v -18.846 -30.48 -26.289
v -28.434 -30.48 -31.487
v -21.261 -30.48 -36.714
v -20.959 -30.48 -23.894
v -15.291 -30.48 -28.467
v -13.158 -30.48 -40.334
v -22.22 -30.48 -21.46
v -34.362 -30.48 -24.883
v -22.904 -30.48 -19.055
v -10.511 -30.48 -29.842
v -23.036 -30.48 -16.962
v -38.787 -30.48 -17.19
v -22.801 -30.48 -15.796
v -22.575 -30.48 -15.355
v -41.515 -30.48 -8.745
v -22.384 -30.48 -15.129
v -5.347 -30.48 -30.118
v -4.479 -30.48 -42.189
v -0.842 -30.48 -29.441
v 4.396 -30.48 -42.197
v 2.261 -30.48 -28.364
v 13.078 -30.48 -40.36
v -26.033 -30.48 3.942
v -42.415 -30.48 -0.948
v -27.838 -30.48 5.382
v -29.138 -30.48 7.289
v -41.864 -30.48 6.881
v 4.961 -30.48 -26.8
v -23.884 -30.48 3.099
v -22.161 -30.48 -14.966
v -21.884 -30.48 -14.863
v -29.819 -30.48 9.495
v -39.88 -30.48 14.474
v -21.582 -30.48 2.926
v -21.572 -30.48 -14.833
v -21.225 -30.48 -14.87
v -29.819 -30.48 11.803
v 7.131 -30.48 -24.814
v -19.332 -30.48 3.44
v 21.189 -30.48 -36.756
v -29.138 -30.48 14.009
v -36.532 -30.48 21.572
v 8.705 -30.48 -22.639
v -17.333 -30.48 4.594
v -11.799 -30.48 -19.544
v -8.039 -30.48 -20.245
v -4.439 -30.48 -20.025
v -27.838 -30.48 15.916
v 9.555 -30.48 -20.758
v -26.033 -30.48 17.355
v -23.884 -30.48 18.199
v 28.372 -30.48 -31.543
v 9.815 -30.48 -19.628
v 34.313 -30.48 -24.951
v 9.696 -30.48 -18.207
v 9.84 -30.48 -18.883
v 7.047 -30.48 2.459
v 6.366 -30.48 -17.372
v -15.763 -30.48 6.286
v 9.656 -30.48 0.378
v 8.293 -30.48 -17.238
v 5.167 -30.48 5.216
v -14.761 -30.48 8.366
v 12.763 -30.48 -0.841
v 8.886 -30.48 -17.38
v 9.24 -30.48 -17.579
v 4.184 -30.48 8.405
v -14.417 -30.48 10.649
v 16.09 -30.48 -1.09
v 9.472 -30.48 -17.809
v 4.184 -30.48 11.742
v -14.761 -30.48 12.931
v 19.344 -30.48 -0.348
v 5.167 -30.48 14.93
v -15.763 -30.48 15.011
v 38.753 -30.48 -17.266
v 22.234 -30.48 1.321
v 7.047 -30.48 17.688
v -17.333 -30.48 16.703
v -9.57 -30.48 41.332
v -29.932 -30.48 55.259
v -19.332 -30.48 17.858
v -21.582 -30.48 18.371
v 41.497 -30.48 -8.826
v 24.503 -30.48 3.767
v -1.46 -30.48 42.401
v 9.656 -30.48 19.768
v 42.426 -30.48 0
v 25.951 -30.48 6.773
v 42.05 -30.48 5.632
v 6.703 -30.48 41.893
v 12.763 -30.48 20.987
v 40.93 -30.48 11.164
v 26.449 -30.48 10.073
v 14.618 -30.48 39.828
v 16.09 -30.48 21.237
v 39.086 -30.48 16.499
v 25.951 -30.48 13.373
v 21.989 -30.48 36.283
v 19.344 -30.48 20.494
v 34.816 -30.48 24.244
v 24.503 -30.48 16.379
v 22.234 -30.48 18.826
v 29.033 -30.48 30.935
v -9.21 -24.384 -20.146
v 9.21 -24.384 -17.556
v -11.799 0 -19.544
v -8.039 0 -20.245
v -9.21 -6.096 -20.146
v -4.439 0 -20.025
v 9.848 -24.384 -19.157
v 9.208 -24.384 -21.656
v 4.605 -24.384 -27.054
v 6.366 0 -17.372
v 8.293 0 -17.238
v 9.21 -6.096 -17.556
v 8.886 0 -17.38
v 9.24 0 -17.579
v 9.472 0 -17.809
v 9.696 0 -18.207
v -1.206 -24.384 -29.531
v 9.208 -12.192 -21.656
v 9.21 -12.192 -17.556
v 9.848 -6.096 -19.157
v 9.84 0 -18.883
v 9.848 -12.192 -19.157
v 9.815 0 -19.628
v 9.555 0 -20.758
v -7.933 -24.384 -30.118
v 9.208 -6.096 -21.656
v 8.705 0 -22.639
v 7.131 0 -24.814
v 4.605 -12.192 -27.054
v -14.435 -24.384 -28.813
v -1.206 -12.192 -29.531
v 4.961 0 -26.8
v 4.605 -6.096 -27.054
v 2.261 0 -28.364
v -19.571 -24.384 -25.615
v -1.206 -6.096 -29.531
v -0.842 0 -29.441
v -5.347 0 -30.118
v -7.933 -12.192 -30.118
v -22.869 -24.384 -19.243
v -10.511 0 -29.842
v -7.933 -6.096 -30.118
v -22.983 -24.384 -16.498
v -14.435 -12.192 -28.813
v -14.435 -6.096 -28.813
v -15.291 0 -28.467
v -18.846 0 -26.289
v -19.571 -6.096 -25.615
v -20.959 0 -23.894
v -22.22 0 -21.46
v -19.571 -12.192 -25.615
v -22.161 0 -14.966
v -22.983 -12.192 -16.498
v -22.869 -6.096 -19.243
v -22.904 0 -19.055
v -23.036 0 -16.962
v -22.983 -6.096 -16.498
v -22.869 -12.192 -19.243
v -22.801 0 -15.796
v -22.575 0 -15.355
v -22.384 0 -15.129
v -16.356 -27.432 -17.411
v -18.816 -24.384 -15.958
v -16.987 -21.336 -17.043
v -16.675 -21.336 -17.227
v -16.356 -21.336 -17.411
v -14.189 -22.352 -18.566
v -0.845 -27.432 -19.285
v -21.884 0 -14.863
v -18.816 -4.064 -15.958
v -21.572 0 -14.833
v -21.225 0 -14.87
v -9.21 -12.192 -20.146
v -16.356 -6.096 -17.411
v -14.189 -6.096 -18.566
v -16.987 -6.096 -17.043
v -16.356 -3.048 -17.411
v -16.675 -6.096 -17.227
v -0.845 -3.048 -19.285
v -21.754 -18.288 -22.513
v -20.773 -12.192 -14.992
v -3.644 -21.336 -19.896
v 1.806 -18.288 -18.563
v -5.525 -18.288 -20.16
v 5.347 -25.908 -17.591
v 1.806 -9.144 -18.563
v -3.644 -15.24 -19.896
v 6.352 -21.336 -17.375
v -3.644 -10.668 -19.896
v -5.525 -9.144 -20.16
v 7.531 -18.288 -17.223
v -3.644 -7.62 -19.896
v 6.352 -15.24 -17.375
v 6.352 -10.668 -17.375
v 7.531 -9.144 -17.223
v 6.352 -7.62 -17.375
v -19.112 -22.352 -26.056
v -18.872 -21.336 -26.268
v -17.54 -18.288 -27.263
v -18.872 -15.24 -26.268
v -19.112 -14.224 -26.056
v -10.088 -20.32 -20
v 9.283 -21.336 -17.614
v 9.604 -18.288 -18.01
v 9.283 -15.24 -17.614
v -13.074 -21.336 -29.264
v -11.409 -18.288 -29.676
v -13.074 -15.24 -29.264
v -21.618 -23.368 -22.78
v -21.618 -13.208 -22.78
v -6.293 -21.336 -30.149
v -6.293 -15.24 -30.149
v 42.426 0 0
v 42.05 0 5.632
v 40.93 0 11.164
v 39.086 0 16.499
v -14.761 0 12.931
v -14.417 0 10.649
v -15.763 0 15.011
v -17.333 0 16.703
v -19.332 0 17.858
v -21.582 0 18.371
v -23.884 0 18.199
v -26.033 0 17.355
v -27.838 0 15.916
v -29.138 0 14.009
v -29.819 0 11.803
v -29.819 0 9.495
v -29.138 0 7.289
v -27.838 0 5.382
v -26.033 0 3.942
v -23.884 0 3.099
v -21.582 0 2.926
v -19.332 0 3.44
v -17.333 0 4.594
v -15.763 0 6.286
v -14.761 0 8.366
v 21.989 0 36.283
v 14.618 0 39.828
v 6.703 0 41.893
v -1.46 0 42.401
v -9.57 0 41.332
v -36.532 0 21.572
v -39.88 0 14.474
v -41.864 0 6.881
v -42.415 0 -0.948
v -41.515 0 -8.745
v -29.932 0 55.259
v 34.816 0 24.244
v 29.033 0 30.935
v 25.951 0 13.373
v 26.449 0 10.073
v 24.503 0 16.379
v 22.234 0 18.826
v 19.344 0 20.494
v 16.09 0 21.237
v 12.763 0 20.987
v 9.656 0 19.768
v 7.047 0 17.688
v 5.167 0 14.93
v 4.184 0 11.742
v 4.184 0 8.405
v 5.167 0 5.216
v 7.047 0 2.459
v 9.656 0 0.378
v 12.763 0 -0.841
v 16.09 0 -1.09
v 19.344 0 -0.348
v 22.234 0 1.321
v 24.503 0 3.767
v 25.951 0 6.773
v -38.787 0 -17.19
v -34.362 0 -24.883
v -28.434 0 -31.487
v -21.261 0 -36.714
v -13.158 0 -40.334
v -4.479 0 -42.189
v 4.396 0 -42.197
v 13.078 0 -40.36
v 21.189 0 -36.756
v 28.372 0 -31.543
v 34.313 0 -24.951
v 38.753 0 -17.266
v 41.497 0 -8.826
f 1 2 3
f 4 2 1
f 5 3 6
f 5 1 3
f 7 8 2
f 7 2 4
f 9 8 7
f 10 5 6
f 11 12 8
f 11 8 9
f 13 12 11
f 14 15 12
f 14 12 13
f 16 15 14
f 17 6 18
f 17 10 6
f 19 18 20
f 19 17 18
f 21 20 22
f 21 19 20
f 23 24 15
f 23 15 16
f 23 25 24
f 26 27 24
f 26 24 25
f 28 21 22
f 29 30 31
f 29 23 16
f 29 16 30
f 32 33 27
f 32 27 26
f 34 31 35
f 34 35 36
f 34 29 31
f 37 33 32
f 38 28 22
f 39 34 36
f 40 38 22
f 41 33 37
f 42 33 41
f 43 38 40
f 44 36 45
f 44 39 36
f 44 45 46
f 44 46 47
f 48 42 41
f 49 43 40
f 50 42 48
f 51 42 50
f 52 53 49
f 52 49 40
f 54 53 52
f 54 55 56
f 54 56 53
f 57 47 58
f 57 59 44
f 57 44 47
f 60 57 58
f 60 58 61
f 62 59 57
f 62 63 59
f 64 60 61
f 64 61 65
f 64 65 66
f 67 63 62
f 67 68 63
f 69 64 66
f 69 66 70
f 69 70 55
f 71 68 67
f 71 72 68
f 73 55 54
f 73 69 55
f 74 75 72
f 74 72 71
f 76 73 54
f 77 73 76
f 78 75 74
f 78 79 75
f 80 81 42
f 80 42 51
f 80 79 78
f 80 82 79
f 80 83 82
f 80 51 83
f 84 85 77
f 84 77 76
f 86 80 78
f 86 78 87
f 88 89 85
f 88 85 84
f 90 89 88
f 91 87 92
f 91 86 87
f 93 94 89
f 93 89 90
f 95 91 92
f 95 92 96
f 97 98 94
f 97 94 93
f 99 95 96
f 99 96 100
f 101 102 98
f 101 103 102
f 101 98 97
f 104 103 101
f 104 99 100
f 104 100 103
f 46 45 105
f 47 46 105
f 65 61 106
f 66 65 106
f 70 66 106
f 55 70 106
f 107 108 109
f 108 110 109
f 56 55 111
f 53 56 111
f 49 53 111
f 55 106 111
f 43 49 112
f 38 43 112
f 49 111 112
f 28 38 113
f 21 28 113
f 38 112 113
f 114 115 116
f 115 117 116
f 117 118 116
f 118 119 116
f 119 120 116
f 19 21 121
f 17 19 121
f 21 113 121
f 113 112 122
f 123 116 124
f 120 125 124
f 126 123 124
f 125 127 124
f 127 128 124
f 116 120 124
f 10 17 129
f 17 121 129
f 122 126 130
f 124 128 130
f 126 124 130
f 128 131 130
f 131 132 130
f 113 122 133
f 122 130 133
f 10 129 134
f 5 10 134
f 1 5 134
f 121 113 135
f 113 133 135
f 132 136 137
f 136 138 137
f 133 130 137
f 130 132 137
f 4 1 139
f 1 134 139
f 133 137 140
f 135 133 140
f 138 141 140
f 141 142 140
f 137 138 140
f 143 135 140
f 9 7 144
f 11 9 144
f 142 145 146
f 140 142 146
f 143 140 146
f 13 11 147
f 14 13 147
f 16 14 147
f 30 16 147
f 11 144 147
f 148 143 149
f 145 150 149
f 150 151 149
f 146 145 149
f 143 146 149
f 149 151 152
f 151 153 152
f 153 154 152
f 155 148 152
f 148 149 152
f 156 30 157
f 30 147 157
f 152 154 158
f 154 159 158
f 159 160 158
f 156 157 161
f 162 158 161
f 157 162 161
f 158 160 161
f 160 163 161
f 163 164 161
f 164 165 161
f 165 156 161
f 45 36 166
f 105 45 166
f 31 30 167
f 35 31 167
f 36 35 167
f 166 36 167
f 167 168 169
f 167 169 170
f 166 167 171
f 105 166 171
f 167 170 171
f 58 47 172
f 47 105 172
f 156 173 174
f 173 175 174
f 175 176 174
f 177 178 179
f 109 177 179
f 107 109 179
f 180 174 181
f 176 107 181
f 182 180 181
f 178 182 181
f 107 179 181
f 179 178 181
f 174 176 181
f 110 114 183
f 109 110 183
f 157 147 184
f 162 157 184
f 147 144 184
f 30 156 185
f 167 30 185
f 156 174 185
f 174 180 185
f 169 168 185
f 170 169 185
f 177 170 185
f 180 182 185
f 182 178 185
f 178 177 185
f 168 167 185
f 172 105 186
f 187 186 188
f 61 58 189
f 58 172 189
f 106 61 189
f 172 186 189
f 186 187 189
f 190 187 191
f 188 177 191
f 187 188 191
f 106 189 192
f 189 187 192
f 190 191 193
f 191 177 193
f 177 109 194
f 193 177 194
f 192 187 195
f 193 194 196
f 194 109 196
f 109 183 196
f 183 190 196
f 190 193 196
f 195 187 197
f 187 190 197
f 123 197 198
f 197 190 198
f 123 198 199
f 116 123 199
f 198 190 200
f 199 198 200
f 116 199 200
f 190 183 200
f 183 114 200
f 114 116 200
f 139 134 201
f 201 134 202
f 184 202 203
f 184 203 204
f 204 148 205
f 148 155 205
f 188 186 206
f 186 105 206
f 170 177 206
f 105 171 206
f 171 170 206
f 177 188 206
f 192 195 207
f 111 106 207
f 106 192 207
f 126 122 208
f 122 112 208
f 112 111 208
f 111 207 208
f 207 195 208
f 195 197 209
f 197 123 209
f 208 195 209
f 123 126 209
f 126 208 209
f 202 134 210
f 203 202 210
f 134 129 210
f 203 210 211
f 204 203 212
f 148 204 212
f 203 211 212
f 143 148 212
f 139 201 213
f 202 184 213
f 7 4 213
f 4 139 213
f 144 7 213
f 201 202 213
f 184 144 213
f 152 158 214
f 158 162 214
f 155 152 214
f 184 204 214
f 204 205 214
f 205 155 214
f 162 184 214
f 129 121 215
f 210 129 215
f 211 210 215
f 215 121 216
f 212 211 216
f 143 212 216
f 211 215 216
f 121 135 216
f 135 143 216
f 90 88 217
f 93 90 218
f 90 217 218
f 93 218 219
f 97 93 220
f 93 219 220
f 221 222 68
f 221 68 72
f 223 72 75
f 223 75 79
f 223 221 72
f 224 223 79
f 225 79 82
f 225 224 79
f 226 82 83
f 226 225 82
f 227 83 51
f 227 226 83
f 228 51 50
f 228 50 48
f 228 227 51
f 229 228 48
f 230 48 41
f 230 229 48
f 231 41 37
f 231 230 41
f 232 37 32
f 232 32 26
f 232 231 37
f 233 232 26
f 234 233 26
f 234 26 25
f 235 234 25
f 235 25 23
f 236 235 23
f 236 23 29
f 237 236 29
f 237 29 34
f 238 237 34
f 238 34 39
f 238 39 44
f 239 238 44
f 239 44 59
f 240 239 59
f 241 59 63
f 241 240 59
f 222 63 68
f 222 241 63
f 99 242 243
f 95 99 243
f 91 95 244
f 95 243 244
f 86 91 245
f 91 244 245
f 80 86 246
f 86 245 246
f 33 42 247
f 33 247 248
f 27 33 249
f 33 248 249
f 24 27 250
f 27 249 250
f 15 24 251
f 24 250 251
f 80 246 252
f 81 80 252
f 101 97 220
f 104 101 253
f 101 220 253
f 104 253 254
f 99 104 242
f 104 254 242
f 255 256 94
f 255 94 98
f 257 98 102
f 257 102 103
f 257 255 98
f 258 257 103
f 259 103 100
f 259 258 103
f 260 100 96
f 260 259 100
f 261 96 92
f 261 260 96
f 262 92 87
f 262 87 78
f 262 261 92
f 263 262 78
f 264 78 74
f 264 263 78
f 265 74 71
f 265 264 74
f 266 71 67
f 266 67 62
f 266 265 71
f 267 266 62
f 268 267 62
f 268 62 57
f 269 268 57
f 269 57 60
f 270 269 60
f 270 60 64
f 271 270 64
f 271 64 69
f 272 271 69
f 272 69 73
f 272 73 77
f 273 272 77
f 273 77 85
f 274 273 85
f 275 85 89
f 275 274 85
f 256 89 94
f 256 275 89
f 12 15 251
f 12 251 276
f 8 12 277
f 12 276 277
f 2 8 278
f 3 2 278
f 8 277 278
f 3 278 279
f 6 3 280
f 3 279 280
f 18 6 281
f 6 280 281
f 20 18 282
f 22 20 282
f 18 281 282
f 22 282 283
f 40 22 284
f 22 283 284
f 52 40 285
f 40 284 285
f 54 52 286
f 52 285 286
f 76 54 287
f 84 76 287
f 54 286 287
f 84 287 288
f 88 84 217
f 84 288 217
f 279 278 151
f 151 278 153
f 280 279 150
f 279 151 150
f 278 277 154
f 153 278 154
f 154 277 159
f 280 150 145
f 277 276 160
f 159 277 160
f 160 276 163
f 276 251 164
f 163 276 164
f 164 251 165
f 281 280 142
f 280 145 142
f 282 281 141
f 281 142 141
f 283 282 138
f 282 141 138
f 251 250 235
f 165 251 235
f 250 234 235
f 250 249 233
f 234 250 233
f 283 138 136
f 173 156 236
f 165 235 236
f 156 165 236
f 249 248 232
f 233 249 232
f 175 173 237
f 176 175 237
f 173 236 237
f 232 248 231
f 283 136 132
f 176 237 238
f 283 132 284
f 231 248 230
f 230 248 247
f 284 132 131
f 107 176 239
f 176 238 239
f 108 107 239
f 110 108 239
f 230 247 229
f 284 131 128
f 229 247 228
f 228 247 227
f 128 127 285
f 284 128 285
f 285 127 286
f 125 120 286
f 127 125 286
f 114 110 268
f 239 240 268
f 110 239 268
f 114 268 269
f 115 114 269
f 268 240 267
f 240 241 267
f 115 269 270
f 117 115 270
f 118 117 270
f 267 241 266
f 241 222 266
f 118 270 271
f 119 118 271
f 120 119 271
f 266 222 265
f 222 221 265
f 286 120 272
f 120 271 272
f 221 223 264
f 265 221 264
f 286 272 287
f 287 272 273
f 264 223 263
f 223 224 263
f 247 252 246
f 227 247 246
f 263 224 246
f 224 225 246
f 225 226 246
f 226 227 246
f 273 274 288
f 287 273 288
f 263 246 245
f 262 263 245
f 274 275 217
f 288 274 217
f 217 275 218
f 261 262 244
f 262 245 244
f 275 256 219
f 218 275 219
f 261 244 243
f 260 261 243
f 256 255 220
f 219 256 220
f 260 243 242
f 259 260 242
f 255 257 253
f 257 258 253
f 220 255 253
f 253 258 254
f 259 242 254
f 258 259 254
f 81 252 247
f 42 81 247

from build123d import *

# Parameters (mm, degrees)
F0_R     = 7.7440612589
F0_R_2   = 11.1948658998
F1_DEPTH = 30.48


with BuildPart() as f1:
    # F0 (on Front) → F1 (new body)
    with BuildSketch(Plane.XZ):
        with BuildLine():
            Line((-29.9317985773, 55.258706212), (-36.5318423106, 21.5723708477))
            ThreePointArc((-36.5318423106, 21.5723708477), (-25.078874165, 34.2197714372), (-9.5695863399, 41.3323808155))
            Line((-9.5695863399, 41.3323808155), (-29.9317985773, 55.258706212))
        make_face()
        with BuildLine():
            ThreePointArc((-41.5147718494, -8.7445071268), (4.3959143597, -42.1973769746), (42.4257314209, 0))
            ThreePointArc((42.4257314209, 0), (41.5824329796, 8.4168850587), (39.0860622287, 16.4991644047))
            ThreePointArc((39.0860622287, 16.4991644047), (32.0996528961, 27.7408538179), (21.989036519, 36.2825710164))
            ThreePointArc((21.989036519, 36.2825710164), (6.7034193095, 41.8928019612), (-9.5695863399, 41.3323808155))
            ThreePointArc((-9.5695863399, 41.3323808155), (-25.078874165, 34.2197714372), (-36.5318423106, 21.5723708477))
            ThreePointArc((-36.5318423106, 21.5723708477), (-41.8640271353, 6.8808370572), (-41.5147718494, -8.7445071268))
        make_face()
        with BuildLine():
            add(Edge.make_bspline(
                [(-22.1610441804, -14.9658992887), (-20.255329571, -13.9210623976), (-15.4016609259, -19.340178891), (-9.2097846791, -20.1464034617)],
                knots=[0, 0, 0, 0, 0.1912524285, 0.1912524285, 0.1912524285, 0.1912524285], degree=3))
            add(Edge.make_bspline(
                [(-9.2097846791, -20.1464034617), (-2.0595940074, -21.0774071147), (13.6055276921, -11.9247658545), (5.9730328386, -31.9282980527), (-22.2913167062, -30.8230217802), (-23.8502365199, -15.8920245666), (-22.1610441804, -14.9658992887)],
                knots=[0.1912524285, 0.1912524285, 0.1912524285, 0.1912524285, 0.4121049254, 0.5784717634, 0.8304771683, 1, 1, 1, 1], degree=3))
        make_face(mode=Mode.SUBTRACT)
        Polygon((-7.4829505756, -12.6634538174), (-11.8000358343, -3.1658634543), (0, -4.8926980235), align=None, mode=Mode.SUBTRACT)
        with Locations((-22.1610441804, 10.6488130987)):
            Circle(F0_R, mode=Mode.SUBTRACT)
        with Locations((15.2537068352, 10.0732017308)):
            Circle(F0_R_2, mode=Mode.SUBTRACT)
        Polygon((0, -4.8926980235), (-11.8000358343, -3.1658634543), (-7.4829505756, -12.6634538174), align=None)
    extrude(amount=F1_DEPTH)


solid = f1.part
